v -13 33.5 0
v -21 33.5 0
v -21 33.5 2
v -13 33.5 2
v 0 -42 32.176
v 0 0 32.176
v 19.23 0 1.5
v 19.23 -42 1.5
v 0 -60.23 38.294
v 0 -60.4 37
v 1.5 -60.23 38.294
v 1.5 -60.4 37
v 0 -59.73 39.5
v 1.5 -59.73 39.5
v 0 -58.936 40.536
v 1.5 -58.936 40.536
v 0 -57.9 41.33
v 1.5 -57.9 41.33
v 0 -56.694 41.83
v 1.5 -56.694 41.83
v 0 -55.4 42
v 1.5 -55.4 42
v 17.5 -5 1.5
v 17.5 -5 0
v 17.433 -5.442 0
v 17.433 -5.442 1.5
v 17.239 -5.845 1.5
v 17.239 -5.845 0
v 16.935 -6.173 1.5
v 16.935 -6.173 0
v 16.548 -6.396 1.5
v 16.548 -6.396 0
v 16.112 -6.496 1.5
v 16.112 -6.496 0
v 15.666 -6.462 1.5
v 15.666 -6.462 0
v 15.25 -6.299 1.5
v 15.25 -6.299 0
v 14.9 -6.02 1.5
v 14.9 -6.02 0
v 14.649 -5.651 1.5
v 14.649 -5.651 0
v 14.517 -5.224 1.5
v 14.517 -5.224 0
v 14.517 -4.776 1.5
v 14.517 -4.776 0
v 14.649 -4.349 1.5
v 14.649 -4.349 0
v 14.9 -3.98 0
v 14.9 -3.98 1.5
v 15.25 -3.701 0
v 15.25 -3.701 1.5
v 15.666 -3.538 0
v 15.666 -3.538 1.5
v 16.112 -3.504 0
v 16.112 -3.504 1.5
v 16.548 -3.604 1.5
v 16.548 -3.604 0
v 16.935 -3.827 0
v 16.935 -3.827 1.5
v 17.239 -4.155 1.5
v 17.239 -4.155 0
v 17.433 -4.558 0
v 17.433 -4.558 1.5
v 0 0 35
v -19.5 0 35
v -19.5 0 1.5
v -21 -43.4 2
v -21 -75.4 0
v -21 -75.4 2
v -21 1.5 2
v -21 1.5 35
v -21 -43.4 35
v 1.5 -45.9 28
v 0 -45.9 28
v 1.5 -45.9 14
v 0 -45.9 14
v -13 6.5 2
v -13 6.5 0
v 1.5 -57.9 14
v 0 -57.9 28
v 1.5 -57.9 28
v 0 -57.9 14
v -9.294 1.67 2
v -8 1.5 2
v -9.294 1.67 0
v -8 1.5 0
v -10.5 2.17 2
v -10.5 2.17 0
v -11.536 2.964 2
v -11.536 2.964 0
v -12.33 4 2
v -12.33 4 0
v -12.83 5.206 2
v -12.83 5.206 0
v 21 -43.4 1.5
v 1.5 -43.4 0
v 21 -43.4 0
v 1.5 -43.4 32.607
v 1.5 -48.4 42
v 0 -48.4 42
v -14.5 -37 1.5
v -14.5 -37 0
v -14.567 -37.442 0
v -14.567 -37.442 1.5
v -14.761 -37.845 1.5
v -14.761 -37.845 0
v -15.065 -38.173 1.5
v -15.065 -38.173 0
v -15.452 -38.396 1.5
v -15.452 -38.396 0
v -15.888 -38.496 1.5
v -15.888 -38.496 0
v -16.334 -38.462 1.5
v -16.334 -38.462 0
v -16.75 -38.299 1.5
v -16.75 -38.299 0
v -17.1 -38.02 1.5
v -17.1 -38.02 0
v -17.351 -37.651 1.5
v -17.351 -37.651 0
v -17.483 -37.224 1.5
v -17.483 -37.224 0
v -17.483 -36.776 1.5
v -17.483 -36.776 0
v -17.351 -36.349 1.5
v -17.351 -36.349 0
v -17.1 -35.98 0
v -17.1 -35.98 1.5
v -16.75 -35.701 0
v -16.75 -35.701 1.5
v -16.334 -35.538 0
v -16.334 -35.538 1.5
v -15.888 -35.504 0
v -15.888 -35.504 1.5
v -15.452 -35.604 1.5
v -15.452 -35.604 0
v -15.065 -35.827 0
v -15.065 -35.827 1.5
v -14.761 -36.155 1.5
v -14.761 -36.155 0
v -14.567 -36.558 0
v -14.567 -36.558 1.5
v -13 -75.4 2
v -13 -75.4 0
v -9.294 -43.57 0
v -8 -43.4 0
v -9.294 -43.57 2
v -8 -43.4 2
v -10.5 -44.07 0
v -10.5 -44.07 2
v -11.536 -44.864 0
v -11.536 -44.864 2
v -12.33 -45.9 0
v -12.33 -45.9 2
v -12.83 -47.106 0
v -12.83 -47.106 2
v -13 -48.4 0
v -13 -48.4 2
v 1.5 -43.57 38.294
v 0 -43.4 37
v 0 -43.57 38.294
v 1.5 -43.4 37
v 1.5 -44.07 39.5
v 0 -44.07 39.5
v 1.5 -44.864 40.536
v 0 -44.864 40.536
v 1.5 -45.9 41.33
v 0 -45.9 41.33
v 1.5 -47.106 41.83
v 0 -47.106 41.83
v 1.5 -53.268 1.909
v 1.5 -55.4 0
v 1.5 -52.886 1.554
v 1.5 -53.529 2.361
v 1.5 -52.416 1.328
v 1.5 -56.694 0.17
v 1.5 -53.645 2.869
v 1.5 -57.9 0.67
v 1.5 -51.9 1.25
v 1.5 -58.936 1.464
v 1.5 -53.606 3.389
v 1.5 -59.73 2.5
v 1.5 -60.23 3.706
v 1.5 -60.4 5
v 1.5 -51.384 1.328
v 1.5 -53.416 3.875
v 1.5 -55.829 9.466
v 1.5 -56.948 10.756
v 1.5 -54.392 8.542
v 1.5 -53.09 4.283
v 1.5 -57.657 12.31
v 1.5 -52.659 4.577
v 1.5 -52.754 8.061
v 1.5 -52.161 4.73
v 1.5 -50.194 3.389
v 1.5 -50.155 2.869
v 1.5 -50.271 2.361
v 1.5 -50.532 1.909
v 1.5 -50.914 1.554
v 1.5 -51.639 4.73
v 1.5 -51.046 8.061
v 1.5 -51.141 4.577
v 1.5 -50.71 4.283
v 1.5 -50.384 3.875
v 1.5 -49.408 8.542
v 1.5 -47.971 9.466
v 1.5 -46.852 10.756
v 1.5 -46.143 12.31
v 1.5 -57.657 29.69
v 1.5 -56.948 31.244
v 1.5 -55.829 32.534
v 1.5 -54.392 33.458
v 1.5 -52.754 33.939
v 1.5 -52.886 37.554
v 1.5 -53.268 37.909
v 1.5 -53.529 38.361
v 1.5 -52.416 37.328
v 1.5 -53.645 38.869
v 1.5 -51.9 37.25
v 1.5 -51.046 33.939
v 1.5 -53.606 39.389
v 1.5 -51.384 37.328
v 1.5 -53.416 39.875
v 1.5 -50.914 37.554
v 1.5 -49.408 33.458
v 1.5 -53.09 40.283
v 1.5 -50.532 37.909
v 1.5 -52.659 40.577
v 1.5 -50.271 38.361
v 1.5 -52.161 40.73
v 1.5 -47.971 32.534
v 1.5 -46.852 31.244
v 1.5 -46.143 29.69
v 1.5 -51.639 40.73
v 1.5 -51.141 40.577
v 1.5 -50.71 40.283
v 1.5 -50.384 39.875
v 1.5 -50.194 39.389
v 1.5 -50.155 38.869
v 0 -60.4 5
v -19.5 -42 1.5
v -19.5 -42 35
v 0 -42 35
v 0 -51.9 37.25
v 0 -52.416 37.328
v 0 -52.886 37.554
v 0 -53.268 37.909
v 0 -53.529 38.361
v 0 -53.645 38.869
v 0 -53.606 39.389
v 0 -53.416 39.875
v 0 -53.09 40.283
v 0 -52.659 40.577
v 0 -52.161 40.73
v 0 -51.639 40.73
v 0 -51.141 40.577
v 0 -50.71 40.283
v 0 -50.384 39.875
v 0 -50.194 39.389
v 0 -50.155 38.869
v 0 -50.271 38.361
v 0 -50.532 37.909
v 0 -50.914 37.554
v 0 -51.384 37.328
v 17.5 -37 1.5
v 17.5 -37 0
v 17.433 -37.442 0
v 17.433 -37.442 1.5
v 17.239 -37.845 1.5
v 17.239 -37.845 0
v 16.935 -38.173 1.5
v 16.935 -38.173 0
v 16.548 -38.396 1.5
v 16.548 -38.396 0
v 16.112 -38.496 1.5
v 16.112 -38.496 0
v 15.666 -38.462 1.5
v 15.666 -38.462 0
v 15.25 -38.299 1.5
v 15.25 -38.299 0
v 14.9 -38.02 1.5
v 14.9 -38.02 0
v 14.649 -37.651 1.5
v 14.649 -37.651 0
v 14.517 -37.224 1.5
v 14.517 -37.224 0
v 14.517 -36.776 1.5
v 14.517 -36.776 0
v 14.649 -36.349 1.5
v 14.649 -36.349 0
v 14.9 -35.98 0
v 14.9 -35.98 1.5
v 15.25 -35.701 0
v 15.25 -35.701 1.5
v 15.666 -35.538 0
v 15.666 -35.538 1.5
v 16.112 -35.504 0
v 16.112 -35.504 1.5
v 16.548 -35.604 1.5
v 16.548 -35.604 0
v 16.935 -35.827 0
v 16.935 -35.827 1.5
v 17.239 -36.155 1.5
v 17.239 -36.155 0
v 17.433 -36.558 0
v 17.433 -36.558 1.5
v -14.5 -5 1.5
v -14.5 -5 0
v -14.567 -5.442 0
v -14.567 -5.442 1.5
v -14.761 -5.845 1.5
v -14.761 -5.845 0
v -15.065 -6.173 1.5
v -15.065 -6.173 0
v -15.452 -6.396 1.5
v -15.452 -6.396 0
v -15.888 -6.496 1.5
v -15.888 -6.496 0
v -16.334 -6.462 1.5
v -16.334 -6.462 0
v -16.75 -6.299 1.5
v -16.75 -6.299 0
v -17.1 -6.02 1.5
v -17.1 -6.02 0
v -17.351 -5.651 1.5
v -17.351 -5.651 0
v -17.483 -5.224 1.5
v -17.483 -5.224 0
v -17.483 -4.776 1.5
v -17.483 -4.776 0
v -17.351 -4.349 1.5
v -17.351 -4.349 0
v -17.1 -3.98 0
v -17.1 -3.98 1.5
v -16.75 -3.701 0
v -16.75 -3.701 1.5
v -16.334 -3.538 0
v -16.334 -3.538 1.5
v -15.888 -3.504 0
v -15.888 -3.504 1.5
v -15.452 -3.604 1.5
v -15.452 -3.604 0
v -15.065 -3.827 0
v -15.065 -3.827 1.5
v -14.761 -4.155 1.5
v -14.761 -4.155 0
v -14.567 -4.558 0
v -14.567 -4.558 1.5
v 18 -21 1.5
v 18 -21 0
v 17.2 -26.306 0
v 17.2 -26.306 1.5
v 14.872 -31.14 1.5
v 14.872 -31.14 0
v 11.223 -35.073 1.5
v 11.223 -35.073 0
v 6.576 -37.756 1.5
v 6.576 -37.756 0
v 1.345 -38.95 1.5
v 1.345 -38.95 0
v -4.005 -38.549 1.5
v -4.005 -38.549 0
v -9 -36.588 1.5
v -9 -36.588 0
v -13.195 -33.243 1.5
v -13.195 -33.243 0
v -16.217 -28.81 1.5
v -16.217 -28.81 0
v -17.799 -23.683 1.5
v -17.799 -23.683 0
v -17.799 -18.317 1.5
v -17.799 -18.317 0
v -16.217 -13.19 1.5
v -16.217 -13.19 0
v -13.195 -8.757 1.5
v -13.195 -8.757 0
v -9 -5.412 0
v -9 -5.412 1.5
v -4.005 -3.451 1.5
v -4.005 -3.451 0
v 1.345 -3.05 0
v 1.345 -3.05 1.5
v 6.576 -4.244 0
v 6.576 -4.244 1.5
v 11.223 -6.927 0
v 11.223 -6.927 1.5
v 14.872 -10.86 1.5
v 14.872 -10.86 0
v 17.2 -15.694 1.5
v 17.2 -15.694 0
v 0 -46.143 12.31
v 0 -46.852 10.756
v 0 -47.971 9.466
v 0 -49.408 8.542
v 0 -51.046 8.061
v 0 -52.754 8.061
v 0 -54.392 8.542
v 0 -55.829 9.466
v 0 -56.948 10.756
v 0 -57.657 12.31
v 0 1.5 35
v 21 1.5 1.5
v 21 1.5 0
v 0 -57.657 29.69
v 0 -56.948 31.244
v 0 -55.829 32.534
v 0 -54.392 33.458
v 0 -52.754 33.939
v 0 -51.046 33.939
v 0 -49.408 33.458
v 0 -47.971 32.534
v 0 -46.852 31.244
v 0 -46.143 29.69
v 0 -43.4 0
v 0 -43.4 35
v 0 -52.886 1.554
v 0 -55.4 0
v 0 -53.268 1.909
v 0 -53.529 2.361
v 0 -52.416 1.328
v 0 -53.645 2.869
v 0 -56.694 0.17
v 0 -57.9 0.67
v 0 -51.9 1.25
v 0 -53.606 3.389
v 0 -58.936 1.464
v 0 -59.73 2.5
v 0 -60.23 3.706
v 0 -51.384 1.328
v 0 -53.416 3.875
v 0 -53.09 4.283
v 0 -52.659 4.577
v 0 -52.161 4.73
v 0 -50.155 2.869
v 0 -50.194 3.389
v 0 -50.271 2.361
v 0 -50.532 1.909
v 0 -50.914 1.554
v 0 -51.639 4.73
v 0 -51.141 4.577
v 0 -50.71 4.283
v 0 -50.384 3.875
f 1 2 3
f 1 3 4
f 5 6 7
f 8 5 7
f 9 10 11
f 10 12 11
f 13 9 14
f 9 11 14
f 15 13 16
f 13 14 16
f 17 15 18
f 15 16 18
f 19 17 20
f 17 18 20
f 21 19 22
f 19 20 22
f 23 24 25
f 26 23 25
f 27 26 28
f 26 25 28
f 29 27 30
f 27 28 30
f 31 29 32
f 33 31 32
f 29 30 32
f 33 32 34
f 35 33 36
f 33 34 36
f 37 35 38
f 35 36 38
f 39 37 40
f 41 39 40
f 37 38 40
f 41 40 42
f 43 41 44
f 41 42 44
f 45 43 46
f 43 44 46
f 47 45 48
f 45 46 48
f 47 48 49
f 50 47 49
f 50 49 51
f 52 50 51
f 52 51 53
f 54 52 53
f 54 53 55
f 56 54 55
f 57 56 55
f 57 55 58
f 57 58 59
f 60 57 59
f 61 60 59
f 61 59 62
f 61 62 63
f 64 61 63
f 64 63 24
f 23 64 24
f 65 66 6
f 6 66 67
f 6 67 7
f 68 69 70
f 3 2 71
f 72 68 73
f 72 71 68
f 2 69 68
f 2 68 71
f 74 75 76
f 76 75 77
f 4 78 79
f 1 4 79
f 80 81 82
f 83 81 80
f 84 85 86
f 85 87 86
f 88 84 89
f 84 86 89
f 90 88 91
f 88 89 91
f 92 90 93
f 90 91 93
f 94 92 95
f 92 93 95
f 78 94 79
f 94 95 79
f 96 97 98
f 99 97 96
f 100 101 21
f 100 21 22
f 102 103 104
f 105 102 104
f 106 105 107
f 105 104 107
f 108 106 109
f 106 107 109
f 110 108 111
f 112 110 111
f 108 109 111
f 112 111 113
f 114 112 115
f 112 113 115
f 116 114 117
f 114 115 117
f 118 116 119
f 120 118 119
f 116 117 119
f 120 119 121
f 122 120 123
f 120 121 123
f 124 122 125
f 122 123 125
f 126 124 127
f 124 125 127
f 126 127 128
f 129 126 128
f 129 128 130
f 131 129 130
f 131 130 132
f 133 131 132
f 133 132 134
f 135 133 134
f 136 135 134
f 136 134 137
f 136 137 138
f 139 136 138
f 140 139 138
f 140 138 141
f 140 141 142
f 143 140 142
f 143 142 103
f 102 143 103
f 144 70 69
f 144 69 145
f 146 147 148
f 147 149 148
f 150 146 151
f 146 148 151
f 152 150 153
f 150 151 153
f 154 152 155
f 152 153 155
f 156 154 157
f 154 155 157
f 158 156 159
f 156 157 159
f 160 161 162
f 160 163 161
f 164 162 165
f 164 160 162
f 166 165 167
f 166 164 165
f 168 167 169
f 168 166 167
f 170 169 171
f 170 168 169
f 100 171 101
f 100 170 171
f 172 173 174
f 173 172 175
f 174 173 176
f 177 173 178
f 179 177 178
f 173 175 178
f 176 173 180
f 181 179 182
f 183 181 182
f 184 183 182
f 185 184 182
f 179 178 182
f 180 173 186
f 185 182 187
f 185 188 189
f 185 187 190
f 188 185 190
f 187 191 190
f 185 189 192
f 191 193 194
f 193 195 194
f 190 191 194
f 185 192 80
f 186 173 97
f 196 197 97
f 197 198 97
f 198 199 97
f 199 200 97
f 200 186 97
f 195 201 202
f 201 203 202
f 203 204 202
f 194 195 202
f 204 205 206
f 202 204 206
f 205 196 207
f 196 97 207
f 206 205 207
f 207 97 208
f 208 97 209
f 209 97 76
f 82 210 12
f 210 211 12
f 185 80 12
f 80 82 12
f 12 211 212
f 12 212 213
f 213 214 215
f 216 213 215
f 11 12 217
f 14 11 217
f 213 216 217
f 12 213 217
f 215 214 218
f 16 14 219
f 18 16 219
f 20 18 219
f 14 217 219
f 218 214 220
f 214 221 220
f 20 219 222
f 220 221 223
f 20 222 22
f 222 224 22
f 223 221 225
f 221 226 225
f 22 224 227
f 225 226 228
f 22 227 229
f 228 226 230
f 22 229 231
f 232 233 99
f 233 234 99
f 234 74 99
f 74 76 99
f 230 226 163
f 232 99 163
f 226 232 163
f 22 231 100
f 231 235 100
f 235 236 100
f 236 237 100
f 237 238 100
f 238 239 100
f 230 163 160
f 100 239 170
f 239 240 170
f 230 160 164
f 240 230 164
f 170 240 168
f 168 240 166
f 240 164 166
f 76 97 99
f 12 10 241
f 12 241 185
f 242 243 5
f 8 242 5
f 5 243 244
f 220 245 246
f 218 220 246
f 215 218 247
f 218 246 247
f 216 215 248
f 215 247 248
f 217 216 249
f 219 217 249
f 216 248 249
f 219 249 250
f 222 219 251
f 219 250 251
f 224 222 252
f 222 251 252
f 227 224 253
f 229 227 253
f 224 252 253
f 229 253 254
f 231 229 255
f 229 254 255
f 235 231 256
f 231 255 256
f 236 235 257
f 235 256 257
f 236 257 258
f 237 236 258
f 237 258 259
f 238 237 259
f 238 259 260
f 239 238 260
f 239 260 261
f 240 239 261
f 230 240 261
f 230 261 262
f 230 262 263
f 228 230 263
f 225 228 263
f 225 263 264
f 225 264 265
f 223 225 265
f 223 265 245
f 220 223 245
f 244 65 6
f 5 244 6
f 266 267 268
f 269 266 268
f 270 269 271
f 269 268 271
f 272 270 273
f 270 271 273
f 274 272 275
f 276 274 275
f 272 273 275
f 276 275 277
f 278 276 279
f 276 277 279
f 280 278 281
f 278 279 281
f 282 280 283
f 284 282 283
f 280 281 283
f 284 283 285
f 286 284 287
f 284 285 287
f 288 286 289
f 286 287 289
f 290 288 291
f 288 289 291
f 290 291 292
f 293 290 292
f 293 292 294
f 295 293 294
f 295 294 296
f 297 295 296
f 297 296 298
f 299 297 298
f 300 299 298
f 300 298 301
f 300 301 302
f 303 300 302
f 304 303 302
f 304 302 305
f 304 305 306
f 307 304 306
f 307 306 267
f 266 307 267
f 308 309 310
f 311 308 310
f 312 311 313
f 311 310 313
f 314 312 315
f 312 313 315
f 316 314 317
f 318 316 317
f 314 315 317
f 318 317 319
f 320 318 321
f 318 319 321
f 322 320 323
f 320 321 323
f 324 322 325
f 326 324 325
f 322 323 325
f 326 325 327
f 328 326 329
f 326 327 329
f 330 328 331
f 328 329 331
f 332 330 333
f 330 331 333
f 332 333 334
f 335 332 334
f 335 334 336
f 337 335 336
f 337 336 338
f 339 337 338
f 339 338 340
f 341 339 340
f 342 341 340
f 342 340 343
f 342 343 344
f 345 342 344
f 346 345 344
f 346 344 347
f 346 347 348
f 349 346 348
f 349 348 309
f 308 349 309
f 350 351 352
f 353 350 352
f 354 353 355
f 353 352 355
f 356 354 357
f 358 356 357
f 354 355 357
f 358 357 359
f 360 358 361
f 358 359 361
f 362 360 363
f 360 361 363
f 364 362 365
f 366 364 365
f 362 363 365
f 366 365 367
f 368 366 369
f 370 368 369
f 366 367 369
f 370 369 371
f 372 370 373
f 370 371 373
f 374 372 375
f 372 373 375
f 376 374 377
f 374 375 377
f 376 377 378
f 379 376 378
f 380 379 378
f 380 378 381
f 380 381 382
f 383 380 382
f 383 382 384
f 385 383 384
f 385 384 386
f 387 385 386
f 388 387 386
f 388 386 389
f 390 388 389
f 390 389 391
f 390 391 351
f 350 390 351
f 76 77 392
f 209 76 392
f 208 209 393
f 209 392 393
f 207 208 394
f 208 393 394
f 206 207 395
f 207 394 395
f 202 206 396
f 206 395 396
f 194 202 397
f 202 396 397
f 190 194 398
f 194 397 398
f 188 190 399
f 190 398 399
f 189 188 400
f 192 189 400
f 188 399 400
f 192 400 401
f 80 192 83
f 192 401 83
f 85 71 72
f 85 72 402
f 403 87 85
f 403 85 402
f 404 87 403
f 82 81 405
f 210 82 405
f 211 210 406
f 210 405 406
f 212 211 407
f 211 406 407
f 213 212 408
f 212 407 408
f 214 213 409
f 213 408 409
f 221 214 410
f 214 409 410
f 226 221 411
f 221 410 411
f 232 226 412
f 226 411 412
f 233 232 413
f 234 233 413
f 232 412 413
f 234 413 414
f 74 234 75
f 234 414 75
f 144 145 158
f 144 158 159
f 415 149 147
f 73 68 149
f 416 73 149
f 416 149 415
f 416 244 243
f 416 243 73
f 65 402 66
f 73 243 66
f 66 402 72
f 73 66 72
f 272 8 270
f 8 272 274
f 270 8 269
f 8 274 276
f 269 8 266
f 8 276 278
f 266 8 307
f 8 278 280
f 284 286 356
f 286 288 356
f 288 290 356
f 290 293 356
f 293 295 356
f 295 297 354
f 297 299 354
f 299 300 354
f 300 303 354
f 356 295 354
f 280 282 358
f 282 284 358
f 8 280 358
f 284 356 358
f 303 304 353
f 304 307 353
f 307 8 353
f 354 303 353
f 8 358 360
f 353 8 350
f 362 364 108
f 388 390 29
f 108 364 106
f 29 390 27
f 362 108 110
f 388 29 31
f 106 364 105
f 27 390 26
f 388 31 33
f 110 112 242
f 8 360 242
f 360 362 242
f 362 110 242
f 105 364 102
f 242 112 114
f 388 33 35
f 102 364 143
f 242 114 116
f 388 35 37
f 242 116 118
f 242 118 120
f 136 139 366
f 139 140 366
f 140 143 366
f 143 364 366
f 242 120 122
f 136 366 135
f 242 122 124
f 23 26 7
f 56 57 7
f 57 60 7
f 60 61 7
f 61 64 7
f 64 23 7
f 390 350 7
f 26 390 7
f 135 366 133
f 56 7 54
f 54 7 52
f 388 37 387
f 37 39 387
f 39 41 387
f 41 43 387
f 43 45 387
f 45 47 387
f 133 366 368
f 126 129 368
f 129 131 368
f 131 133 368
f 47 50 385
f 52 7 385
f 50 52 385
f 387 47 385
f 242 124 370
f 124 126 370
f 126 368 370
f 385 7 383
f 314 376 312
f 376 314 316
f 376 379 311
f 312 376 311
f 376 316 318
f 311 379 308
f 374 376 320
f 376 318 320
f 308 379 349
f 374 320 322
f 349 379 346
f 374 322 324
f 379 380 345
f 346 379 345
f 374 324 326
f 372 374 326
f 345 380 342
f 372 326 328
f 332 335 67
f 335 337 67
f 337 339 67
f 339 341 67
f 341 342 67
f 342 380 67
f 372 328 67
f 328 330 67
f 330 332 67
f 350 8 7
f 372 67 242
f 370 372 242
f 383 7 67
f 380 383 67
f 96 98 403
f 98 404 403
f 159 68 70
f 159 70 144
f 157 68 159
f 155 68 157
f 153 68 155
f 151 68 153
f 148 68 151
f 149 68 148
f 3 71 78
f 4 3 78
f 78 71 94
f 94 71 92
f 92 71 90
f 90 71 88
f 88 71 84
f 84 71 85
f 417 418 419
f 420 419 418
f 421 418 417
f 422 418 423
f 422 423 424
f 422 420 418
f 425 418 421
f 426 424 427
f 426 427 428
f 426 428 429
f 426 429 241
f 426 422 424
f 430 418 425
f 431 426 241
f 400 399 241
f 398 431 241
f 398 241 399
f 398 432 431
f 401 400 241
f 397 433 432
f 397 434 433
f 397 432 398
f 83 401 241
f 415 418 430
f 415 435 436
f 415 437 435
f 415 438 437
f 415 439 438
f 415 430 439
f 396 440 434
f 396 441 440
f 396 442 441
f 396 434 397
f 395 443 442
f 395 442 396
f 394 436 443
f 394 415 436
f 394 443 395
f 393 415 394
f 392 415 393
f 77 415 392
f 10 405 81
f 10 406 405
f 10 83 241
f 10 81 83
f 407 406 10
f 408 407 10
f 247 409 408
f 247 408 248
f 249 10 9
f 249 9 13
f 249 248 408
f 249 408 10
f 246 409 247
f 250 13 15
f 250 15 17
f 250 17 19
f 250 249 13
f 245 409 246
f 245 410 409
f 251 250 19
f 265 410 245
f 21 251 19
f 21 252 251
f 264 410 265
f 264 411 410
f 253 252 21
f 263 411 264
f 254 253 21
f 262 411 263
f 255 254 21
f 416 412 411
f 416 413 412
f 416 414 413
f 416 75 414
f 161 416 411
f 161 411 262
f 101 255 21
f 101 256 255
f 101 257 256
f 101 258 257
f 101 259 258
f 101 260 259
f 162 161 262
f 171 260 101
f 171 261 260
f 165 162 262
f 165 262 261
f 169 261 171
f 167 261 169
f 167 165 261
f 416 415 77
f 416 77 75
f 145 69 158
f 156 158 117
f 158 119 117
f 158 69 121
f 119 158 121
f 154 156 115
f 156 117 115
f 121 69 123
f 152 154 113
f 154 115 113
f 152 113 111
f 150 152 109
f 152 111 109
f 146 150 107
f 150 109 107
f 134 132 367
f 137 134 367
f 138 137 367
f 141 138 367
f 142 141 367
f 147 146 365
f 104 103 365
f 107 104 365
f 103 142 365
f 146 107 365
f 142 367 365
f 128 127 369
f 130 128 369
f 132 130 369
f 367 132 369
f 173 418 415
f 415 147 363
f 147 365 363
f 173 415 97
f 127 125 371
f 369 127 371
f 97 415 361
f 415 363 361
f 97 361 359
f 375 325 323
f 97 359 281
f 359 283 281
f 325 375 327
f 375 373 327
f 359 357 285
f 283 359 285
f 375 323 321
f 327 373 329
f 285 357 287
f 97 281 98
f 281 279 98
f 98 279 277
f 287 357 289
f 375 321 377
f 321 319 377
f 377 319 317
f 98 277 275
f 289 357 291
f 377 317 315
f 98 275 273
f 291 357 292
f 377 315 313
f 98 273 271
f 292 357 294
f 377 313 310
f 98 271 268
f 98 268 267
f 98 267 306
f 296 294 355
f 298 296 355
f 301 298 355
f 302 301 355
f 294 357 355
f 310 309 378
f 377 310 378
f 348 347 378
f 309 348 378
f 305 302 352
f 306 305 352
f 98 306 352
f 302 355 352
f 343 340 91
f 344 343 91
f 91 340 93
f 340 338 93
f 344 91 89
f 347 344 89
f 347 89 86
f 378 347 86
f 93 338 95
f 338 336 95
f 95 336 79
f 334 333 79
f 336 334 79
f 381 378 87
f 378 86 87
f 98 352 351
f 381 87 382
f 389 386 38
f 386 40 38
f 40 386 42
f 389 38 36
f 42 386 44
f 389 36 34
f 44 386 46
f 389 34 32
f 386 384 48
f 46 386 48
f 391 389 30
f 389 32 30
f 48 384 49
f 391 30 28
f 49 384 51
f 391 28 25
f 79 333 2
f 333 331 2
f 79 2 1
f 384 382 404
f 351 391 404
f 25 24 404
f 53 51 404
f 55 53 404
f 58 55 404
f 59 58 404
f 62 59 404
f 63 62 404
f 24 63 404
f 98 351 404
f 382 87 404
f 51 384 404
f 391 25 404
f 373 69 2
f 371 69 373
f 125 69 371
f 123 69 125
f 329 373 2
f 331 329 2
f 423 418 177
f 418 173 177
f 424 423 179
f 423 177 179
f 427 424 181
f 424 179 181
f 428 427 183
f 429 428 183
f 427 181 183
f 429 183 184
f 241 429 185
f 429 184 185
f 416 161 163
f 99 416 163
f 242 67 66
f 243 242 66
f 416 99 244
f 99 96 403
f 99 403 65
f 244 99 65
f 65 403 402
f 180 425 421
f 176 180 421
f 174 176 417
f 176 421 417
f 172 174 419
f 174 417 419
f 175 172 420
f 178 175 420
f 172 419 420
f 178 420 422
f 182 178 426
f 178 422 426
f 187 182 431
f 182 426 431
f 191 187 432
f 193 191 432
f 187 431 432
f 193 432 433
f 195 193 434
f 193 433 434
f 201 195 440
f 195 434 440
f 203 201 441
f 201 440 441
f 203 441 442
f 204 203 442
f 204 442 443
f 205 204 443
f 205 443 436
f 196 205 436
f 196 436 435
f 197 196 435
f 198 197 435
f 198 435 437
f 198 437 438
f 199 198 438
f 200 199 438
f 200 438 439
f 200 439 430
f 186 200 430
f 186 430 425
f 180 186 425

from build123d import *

# Parameters (mm, degrees)
PAD047_DEPTH    = 42
SKETCH076_R     = 18
SKETCH076_R_2   = 1.5
POCKET023_DEPTH = 2
PAD048_DEPTH    = 1.5
PAD049_DEPTH    = 1.4
SKETCH079_W     = 8
SKETCH079_H     = 2
PAD050_DEPTH    = 32
SKETCH080_W     = 8
SKETCH080_H     = 2
PAD051_DEPTH    = 32
SKETCH081_W     = 1.5
SKETCH081_H     = 42
PAD052_DEPTH    = 17
SKETCH082_R     = 1.75
POCKET024_DEPTH = 5
FILLET002_R     = 5


with BuildPart() as part:
    # Sketch075 → Pad047 (new body)
    with BuildSketch(Plane.XZ):
        Polygon((-21, 0), (21, 0), (21, 1.5), (0, 35), (0, 32.17586), (19.229644, 1.5), (-19.5, 1.5), (-19.5, 35), (-21, 35), align=None)
    extrude(amount=PAD047_DEPTH)

    # Sketch076 (on Face2 of Pad047) → Pocket023 (cut)
    with BuildSketch(Plane(origin=(0, 0, 0), x_dir=(1, 0, 0), z_dir=(0, 0, -1))):
        with Locations((0, 21)):
            Circle(SKETCH076_R)
        with Locations((-16, 37)):
            Circle(SKETCH076_R_2)
        with Locations((16, 37)):
            Circle(SKETCH076_R_2)
        with Locations((16, 5)):
            Circle(SKETCH076_R_2)
        with Locations((-16, 5)):
            Circle(SKETCH076_R_2)
    extrude(amount=-POCKET023_DEPTH, mode=Mode.SUBTRACT)

    # Sketch077 (on Face4 of Pocket023) → Pad048 (join)
    with BuildSketch(Plane(origin=(0, 0, 0), x_dir=(1, 0, 0), z_dir=(0, 1, 0))):
        Polygon((-21, -35), (0, -35), (21, -1.5), (21, 0), (-21, 0), align=None)
    extrude(amount=PAD048_DEPTH)

    # Sketch078 (on Face1 of Pad048) → Pad049 (join)
    with BuildSketch(Plane.XZ.offset(42)):
        Polygon((-21, 35), (-21, 0), (21, 0), (21, 1.5), (0, 35), align=None)
    extrude(amount=PAD049_DEPTH)

    # Sketch079 (on Face14 of Pad049) → Pad050 (join)
    with BuildSketch(Plane(origin=(0, 1.5, 0), x_dir=(1, 0, 0), z_dir=(0, 1, 0))):
        with Locations((-17, -1)):
            Rectangle(SKETCH079_W, SKETCH079_H)
    extrude(amount=PAD050_DEPTH)

    # Sketch080 (on Face1 of Pad050) → Pad051 (join)
    with BuildSketch(Plane.XZ.offset(43.4)):
        with Locations((-17, 1)):
            Rectangle(SKETCH080_W, SKETCH080_H)
    extrude(amount=PAD051_DEPTH)

    # Sketch081 (on Face1 of Pad051) → Pad052 (join)
    with BuildSketch(Plane.XZ.offset(43.4)):
        with Locations((0.75, 21)):
            Rectangle(SKETCH081_W, SKETCH081_H)
    extrude(amount=PAD052_DEPTH)

    # Sketch082 (on Face5 of Pad052) → Pocket024 (cut)
    with BuildSketch(Plane(origin=(0, 0, 0), x_dir=(0, 0, -1), z_dir=(-1, 0, 0))):
        with Locations((-39, 51.9)):
            Circle(SKETCH082_R)
        with Locations((-3, 51.9)):
            Circle(SKETCH082_R)
        with BuildLine():
            ThreePointArc((-28, 57.9), (-34, 51.9), (-28, 45.9))
            Line((-28, 45.9), (-14, 45.9))
            ThreePointArc((-14, 45.9), (-8, 51.9), (-14, 57.9))
            Line((-28, 57.9), (-14, 57.9))
        make_face()
    extrude(amount=-POCKET024_DEPTH, mode=Mode.SUBTRACT)

    # Fillet002
    fillet002_edges = [part.edges().sort_by_distance(p)[0] for p in [
        (0.75, -43.4, 42),
        (0.75, -60.4, 42),
        (0.75, -60.4, 0),
        (-13, -43.4, 1),
        (-13, 1.5, 1),
    ]]
    fillet(fillet002_edges, radius=FILLET002_R)


solid = part.part
